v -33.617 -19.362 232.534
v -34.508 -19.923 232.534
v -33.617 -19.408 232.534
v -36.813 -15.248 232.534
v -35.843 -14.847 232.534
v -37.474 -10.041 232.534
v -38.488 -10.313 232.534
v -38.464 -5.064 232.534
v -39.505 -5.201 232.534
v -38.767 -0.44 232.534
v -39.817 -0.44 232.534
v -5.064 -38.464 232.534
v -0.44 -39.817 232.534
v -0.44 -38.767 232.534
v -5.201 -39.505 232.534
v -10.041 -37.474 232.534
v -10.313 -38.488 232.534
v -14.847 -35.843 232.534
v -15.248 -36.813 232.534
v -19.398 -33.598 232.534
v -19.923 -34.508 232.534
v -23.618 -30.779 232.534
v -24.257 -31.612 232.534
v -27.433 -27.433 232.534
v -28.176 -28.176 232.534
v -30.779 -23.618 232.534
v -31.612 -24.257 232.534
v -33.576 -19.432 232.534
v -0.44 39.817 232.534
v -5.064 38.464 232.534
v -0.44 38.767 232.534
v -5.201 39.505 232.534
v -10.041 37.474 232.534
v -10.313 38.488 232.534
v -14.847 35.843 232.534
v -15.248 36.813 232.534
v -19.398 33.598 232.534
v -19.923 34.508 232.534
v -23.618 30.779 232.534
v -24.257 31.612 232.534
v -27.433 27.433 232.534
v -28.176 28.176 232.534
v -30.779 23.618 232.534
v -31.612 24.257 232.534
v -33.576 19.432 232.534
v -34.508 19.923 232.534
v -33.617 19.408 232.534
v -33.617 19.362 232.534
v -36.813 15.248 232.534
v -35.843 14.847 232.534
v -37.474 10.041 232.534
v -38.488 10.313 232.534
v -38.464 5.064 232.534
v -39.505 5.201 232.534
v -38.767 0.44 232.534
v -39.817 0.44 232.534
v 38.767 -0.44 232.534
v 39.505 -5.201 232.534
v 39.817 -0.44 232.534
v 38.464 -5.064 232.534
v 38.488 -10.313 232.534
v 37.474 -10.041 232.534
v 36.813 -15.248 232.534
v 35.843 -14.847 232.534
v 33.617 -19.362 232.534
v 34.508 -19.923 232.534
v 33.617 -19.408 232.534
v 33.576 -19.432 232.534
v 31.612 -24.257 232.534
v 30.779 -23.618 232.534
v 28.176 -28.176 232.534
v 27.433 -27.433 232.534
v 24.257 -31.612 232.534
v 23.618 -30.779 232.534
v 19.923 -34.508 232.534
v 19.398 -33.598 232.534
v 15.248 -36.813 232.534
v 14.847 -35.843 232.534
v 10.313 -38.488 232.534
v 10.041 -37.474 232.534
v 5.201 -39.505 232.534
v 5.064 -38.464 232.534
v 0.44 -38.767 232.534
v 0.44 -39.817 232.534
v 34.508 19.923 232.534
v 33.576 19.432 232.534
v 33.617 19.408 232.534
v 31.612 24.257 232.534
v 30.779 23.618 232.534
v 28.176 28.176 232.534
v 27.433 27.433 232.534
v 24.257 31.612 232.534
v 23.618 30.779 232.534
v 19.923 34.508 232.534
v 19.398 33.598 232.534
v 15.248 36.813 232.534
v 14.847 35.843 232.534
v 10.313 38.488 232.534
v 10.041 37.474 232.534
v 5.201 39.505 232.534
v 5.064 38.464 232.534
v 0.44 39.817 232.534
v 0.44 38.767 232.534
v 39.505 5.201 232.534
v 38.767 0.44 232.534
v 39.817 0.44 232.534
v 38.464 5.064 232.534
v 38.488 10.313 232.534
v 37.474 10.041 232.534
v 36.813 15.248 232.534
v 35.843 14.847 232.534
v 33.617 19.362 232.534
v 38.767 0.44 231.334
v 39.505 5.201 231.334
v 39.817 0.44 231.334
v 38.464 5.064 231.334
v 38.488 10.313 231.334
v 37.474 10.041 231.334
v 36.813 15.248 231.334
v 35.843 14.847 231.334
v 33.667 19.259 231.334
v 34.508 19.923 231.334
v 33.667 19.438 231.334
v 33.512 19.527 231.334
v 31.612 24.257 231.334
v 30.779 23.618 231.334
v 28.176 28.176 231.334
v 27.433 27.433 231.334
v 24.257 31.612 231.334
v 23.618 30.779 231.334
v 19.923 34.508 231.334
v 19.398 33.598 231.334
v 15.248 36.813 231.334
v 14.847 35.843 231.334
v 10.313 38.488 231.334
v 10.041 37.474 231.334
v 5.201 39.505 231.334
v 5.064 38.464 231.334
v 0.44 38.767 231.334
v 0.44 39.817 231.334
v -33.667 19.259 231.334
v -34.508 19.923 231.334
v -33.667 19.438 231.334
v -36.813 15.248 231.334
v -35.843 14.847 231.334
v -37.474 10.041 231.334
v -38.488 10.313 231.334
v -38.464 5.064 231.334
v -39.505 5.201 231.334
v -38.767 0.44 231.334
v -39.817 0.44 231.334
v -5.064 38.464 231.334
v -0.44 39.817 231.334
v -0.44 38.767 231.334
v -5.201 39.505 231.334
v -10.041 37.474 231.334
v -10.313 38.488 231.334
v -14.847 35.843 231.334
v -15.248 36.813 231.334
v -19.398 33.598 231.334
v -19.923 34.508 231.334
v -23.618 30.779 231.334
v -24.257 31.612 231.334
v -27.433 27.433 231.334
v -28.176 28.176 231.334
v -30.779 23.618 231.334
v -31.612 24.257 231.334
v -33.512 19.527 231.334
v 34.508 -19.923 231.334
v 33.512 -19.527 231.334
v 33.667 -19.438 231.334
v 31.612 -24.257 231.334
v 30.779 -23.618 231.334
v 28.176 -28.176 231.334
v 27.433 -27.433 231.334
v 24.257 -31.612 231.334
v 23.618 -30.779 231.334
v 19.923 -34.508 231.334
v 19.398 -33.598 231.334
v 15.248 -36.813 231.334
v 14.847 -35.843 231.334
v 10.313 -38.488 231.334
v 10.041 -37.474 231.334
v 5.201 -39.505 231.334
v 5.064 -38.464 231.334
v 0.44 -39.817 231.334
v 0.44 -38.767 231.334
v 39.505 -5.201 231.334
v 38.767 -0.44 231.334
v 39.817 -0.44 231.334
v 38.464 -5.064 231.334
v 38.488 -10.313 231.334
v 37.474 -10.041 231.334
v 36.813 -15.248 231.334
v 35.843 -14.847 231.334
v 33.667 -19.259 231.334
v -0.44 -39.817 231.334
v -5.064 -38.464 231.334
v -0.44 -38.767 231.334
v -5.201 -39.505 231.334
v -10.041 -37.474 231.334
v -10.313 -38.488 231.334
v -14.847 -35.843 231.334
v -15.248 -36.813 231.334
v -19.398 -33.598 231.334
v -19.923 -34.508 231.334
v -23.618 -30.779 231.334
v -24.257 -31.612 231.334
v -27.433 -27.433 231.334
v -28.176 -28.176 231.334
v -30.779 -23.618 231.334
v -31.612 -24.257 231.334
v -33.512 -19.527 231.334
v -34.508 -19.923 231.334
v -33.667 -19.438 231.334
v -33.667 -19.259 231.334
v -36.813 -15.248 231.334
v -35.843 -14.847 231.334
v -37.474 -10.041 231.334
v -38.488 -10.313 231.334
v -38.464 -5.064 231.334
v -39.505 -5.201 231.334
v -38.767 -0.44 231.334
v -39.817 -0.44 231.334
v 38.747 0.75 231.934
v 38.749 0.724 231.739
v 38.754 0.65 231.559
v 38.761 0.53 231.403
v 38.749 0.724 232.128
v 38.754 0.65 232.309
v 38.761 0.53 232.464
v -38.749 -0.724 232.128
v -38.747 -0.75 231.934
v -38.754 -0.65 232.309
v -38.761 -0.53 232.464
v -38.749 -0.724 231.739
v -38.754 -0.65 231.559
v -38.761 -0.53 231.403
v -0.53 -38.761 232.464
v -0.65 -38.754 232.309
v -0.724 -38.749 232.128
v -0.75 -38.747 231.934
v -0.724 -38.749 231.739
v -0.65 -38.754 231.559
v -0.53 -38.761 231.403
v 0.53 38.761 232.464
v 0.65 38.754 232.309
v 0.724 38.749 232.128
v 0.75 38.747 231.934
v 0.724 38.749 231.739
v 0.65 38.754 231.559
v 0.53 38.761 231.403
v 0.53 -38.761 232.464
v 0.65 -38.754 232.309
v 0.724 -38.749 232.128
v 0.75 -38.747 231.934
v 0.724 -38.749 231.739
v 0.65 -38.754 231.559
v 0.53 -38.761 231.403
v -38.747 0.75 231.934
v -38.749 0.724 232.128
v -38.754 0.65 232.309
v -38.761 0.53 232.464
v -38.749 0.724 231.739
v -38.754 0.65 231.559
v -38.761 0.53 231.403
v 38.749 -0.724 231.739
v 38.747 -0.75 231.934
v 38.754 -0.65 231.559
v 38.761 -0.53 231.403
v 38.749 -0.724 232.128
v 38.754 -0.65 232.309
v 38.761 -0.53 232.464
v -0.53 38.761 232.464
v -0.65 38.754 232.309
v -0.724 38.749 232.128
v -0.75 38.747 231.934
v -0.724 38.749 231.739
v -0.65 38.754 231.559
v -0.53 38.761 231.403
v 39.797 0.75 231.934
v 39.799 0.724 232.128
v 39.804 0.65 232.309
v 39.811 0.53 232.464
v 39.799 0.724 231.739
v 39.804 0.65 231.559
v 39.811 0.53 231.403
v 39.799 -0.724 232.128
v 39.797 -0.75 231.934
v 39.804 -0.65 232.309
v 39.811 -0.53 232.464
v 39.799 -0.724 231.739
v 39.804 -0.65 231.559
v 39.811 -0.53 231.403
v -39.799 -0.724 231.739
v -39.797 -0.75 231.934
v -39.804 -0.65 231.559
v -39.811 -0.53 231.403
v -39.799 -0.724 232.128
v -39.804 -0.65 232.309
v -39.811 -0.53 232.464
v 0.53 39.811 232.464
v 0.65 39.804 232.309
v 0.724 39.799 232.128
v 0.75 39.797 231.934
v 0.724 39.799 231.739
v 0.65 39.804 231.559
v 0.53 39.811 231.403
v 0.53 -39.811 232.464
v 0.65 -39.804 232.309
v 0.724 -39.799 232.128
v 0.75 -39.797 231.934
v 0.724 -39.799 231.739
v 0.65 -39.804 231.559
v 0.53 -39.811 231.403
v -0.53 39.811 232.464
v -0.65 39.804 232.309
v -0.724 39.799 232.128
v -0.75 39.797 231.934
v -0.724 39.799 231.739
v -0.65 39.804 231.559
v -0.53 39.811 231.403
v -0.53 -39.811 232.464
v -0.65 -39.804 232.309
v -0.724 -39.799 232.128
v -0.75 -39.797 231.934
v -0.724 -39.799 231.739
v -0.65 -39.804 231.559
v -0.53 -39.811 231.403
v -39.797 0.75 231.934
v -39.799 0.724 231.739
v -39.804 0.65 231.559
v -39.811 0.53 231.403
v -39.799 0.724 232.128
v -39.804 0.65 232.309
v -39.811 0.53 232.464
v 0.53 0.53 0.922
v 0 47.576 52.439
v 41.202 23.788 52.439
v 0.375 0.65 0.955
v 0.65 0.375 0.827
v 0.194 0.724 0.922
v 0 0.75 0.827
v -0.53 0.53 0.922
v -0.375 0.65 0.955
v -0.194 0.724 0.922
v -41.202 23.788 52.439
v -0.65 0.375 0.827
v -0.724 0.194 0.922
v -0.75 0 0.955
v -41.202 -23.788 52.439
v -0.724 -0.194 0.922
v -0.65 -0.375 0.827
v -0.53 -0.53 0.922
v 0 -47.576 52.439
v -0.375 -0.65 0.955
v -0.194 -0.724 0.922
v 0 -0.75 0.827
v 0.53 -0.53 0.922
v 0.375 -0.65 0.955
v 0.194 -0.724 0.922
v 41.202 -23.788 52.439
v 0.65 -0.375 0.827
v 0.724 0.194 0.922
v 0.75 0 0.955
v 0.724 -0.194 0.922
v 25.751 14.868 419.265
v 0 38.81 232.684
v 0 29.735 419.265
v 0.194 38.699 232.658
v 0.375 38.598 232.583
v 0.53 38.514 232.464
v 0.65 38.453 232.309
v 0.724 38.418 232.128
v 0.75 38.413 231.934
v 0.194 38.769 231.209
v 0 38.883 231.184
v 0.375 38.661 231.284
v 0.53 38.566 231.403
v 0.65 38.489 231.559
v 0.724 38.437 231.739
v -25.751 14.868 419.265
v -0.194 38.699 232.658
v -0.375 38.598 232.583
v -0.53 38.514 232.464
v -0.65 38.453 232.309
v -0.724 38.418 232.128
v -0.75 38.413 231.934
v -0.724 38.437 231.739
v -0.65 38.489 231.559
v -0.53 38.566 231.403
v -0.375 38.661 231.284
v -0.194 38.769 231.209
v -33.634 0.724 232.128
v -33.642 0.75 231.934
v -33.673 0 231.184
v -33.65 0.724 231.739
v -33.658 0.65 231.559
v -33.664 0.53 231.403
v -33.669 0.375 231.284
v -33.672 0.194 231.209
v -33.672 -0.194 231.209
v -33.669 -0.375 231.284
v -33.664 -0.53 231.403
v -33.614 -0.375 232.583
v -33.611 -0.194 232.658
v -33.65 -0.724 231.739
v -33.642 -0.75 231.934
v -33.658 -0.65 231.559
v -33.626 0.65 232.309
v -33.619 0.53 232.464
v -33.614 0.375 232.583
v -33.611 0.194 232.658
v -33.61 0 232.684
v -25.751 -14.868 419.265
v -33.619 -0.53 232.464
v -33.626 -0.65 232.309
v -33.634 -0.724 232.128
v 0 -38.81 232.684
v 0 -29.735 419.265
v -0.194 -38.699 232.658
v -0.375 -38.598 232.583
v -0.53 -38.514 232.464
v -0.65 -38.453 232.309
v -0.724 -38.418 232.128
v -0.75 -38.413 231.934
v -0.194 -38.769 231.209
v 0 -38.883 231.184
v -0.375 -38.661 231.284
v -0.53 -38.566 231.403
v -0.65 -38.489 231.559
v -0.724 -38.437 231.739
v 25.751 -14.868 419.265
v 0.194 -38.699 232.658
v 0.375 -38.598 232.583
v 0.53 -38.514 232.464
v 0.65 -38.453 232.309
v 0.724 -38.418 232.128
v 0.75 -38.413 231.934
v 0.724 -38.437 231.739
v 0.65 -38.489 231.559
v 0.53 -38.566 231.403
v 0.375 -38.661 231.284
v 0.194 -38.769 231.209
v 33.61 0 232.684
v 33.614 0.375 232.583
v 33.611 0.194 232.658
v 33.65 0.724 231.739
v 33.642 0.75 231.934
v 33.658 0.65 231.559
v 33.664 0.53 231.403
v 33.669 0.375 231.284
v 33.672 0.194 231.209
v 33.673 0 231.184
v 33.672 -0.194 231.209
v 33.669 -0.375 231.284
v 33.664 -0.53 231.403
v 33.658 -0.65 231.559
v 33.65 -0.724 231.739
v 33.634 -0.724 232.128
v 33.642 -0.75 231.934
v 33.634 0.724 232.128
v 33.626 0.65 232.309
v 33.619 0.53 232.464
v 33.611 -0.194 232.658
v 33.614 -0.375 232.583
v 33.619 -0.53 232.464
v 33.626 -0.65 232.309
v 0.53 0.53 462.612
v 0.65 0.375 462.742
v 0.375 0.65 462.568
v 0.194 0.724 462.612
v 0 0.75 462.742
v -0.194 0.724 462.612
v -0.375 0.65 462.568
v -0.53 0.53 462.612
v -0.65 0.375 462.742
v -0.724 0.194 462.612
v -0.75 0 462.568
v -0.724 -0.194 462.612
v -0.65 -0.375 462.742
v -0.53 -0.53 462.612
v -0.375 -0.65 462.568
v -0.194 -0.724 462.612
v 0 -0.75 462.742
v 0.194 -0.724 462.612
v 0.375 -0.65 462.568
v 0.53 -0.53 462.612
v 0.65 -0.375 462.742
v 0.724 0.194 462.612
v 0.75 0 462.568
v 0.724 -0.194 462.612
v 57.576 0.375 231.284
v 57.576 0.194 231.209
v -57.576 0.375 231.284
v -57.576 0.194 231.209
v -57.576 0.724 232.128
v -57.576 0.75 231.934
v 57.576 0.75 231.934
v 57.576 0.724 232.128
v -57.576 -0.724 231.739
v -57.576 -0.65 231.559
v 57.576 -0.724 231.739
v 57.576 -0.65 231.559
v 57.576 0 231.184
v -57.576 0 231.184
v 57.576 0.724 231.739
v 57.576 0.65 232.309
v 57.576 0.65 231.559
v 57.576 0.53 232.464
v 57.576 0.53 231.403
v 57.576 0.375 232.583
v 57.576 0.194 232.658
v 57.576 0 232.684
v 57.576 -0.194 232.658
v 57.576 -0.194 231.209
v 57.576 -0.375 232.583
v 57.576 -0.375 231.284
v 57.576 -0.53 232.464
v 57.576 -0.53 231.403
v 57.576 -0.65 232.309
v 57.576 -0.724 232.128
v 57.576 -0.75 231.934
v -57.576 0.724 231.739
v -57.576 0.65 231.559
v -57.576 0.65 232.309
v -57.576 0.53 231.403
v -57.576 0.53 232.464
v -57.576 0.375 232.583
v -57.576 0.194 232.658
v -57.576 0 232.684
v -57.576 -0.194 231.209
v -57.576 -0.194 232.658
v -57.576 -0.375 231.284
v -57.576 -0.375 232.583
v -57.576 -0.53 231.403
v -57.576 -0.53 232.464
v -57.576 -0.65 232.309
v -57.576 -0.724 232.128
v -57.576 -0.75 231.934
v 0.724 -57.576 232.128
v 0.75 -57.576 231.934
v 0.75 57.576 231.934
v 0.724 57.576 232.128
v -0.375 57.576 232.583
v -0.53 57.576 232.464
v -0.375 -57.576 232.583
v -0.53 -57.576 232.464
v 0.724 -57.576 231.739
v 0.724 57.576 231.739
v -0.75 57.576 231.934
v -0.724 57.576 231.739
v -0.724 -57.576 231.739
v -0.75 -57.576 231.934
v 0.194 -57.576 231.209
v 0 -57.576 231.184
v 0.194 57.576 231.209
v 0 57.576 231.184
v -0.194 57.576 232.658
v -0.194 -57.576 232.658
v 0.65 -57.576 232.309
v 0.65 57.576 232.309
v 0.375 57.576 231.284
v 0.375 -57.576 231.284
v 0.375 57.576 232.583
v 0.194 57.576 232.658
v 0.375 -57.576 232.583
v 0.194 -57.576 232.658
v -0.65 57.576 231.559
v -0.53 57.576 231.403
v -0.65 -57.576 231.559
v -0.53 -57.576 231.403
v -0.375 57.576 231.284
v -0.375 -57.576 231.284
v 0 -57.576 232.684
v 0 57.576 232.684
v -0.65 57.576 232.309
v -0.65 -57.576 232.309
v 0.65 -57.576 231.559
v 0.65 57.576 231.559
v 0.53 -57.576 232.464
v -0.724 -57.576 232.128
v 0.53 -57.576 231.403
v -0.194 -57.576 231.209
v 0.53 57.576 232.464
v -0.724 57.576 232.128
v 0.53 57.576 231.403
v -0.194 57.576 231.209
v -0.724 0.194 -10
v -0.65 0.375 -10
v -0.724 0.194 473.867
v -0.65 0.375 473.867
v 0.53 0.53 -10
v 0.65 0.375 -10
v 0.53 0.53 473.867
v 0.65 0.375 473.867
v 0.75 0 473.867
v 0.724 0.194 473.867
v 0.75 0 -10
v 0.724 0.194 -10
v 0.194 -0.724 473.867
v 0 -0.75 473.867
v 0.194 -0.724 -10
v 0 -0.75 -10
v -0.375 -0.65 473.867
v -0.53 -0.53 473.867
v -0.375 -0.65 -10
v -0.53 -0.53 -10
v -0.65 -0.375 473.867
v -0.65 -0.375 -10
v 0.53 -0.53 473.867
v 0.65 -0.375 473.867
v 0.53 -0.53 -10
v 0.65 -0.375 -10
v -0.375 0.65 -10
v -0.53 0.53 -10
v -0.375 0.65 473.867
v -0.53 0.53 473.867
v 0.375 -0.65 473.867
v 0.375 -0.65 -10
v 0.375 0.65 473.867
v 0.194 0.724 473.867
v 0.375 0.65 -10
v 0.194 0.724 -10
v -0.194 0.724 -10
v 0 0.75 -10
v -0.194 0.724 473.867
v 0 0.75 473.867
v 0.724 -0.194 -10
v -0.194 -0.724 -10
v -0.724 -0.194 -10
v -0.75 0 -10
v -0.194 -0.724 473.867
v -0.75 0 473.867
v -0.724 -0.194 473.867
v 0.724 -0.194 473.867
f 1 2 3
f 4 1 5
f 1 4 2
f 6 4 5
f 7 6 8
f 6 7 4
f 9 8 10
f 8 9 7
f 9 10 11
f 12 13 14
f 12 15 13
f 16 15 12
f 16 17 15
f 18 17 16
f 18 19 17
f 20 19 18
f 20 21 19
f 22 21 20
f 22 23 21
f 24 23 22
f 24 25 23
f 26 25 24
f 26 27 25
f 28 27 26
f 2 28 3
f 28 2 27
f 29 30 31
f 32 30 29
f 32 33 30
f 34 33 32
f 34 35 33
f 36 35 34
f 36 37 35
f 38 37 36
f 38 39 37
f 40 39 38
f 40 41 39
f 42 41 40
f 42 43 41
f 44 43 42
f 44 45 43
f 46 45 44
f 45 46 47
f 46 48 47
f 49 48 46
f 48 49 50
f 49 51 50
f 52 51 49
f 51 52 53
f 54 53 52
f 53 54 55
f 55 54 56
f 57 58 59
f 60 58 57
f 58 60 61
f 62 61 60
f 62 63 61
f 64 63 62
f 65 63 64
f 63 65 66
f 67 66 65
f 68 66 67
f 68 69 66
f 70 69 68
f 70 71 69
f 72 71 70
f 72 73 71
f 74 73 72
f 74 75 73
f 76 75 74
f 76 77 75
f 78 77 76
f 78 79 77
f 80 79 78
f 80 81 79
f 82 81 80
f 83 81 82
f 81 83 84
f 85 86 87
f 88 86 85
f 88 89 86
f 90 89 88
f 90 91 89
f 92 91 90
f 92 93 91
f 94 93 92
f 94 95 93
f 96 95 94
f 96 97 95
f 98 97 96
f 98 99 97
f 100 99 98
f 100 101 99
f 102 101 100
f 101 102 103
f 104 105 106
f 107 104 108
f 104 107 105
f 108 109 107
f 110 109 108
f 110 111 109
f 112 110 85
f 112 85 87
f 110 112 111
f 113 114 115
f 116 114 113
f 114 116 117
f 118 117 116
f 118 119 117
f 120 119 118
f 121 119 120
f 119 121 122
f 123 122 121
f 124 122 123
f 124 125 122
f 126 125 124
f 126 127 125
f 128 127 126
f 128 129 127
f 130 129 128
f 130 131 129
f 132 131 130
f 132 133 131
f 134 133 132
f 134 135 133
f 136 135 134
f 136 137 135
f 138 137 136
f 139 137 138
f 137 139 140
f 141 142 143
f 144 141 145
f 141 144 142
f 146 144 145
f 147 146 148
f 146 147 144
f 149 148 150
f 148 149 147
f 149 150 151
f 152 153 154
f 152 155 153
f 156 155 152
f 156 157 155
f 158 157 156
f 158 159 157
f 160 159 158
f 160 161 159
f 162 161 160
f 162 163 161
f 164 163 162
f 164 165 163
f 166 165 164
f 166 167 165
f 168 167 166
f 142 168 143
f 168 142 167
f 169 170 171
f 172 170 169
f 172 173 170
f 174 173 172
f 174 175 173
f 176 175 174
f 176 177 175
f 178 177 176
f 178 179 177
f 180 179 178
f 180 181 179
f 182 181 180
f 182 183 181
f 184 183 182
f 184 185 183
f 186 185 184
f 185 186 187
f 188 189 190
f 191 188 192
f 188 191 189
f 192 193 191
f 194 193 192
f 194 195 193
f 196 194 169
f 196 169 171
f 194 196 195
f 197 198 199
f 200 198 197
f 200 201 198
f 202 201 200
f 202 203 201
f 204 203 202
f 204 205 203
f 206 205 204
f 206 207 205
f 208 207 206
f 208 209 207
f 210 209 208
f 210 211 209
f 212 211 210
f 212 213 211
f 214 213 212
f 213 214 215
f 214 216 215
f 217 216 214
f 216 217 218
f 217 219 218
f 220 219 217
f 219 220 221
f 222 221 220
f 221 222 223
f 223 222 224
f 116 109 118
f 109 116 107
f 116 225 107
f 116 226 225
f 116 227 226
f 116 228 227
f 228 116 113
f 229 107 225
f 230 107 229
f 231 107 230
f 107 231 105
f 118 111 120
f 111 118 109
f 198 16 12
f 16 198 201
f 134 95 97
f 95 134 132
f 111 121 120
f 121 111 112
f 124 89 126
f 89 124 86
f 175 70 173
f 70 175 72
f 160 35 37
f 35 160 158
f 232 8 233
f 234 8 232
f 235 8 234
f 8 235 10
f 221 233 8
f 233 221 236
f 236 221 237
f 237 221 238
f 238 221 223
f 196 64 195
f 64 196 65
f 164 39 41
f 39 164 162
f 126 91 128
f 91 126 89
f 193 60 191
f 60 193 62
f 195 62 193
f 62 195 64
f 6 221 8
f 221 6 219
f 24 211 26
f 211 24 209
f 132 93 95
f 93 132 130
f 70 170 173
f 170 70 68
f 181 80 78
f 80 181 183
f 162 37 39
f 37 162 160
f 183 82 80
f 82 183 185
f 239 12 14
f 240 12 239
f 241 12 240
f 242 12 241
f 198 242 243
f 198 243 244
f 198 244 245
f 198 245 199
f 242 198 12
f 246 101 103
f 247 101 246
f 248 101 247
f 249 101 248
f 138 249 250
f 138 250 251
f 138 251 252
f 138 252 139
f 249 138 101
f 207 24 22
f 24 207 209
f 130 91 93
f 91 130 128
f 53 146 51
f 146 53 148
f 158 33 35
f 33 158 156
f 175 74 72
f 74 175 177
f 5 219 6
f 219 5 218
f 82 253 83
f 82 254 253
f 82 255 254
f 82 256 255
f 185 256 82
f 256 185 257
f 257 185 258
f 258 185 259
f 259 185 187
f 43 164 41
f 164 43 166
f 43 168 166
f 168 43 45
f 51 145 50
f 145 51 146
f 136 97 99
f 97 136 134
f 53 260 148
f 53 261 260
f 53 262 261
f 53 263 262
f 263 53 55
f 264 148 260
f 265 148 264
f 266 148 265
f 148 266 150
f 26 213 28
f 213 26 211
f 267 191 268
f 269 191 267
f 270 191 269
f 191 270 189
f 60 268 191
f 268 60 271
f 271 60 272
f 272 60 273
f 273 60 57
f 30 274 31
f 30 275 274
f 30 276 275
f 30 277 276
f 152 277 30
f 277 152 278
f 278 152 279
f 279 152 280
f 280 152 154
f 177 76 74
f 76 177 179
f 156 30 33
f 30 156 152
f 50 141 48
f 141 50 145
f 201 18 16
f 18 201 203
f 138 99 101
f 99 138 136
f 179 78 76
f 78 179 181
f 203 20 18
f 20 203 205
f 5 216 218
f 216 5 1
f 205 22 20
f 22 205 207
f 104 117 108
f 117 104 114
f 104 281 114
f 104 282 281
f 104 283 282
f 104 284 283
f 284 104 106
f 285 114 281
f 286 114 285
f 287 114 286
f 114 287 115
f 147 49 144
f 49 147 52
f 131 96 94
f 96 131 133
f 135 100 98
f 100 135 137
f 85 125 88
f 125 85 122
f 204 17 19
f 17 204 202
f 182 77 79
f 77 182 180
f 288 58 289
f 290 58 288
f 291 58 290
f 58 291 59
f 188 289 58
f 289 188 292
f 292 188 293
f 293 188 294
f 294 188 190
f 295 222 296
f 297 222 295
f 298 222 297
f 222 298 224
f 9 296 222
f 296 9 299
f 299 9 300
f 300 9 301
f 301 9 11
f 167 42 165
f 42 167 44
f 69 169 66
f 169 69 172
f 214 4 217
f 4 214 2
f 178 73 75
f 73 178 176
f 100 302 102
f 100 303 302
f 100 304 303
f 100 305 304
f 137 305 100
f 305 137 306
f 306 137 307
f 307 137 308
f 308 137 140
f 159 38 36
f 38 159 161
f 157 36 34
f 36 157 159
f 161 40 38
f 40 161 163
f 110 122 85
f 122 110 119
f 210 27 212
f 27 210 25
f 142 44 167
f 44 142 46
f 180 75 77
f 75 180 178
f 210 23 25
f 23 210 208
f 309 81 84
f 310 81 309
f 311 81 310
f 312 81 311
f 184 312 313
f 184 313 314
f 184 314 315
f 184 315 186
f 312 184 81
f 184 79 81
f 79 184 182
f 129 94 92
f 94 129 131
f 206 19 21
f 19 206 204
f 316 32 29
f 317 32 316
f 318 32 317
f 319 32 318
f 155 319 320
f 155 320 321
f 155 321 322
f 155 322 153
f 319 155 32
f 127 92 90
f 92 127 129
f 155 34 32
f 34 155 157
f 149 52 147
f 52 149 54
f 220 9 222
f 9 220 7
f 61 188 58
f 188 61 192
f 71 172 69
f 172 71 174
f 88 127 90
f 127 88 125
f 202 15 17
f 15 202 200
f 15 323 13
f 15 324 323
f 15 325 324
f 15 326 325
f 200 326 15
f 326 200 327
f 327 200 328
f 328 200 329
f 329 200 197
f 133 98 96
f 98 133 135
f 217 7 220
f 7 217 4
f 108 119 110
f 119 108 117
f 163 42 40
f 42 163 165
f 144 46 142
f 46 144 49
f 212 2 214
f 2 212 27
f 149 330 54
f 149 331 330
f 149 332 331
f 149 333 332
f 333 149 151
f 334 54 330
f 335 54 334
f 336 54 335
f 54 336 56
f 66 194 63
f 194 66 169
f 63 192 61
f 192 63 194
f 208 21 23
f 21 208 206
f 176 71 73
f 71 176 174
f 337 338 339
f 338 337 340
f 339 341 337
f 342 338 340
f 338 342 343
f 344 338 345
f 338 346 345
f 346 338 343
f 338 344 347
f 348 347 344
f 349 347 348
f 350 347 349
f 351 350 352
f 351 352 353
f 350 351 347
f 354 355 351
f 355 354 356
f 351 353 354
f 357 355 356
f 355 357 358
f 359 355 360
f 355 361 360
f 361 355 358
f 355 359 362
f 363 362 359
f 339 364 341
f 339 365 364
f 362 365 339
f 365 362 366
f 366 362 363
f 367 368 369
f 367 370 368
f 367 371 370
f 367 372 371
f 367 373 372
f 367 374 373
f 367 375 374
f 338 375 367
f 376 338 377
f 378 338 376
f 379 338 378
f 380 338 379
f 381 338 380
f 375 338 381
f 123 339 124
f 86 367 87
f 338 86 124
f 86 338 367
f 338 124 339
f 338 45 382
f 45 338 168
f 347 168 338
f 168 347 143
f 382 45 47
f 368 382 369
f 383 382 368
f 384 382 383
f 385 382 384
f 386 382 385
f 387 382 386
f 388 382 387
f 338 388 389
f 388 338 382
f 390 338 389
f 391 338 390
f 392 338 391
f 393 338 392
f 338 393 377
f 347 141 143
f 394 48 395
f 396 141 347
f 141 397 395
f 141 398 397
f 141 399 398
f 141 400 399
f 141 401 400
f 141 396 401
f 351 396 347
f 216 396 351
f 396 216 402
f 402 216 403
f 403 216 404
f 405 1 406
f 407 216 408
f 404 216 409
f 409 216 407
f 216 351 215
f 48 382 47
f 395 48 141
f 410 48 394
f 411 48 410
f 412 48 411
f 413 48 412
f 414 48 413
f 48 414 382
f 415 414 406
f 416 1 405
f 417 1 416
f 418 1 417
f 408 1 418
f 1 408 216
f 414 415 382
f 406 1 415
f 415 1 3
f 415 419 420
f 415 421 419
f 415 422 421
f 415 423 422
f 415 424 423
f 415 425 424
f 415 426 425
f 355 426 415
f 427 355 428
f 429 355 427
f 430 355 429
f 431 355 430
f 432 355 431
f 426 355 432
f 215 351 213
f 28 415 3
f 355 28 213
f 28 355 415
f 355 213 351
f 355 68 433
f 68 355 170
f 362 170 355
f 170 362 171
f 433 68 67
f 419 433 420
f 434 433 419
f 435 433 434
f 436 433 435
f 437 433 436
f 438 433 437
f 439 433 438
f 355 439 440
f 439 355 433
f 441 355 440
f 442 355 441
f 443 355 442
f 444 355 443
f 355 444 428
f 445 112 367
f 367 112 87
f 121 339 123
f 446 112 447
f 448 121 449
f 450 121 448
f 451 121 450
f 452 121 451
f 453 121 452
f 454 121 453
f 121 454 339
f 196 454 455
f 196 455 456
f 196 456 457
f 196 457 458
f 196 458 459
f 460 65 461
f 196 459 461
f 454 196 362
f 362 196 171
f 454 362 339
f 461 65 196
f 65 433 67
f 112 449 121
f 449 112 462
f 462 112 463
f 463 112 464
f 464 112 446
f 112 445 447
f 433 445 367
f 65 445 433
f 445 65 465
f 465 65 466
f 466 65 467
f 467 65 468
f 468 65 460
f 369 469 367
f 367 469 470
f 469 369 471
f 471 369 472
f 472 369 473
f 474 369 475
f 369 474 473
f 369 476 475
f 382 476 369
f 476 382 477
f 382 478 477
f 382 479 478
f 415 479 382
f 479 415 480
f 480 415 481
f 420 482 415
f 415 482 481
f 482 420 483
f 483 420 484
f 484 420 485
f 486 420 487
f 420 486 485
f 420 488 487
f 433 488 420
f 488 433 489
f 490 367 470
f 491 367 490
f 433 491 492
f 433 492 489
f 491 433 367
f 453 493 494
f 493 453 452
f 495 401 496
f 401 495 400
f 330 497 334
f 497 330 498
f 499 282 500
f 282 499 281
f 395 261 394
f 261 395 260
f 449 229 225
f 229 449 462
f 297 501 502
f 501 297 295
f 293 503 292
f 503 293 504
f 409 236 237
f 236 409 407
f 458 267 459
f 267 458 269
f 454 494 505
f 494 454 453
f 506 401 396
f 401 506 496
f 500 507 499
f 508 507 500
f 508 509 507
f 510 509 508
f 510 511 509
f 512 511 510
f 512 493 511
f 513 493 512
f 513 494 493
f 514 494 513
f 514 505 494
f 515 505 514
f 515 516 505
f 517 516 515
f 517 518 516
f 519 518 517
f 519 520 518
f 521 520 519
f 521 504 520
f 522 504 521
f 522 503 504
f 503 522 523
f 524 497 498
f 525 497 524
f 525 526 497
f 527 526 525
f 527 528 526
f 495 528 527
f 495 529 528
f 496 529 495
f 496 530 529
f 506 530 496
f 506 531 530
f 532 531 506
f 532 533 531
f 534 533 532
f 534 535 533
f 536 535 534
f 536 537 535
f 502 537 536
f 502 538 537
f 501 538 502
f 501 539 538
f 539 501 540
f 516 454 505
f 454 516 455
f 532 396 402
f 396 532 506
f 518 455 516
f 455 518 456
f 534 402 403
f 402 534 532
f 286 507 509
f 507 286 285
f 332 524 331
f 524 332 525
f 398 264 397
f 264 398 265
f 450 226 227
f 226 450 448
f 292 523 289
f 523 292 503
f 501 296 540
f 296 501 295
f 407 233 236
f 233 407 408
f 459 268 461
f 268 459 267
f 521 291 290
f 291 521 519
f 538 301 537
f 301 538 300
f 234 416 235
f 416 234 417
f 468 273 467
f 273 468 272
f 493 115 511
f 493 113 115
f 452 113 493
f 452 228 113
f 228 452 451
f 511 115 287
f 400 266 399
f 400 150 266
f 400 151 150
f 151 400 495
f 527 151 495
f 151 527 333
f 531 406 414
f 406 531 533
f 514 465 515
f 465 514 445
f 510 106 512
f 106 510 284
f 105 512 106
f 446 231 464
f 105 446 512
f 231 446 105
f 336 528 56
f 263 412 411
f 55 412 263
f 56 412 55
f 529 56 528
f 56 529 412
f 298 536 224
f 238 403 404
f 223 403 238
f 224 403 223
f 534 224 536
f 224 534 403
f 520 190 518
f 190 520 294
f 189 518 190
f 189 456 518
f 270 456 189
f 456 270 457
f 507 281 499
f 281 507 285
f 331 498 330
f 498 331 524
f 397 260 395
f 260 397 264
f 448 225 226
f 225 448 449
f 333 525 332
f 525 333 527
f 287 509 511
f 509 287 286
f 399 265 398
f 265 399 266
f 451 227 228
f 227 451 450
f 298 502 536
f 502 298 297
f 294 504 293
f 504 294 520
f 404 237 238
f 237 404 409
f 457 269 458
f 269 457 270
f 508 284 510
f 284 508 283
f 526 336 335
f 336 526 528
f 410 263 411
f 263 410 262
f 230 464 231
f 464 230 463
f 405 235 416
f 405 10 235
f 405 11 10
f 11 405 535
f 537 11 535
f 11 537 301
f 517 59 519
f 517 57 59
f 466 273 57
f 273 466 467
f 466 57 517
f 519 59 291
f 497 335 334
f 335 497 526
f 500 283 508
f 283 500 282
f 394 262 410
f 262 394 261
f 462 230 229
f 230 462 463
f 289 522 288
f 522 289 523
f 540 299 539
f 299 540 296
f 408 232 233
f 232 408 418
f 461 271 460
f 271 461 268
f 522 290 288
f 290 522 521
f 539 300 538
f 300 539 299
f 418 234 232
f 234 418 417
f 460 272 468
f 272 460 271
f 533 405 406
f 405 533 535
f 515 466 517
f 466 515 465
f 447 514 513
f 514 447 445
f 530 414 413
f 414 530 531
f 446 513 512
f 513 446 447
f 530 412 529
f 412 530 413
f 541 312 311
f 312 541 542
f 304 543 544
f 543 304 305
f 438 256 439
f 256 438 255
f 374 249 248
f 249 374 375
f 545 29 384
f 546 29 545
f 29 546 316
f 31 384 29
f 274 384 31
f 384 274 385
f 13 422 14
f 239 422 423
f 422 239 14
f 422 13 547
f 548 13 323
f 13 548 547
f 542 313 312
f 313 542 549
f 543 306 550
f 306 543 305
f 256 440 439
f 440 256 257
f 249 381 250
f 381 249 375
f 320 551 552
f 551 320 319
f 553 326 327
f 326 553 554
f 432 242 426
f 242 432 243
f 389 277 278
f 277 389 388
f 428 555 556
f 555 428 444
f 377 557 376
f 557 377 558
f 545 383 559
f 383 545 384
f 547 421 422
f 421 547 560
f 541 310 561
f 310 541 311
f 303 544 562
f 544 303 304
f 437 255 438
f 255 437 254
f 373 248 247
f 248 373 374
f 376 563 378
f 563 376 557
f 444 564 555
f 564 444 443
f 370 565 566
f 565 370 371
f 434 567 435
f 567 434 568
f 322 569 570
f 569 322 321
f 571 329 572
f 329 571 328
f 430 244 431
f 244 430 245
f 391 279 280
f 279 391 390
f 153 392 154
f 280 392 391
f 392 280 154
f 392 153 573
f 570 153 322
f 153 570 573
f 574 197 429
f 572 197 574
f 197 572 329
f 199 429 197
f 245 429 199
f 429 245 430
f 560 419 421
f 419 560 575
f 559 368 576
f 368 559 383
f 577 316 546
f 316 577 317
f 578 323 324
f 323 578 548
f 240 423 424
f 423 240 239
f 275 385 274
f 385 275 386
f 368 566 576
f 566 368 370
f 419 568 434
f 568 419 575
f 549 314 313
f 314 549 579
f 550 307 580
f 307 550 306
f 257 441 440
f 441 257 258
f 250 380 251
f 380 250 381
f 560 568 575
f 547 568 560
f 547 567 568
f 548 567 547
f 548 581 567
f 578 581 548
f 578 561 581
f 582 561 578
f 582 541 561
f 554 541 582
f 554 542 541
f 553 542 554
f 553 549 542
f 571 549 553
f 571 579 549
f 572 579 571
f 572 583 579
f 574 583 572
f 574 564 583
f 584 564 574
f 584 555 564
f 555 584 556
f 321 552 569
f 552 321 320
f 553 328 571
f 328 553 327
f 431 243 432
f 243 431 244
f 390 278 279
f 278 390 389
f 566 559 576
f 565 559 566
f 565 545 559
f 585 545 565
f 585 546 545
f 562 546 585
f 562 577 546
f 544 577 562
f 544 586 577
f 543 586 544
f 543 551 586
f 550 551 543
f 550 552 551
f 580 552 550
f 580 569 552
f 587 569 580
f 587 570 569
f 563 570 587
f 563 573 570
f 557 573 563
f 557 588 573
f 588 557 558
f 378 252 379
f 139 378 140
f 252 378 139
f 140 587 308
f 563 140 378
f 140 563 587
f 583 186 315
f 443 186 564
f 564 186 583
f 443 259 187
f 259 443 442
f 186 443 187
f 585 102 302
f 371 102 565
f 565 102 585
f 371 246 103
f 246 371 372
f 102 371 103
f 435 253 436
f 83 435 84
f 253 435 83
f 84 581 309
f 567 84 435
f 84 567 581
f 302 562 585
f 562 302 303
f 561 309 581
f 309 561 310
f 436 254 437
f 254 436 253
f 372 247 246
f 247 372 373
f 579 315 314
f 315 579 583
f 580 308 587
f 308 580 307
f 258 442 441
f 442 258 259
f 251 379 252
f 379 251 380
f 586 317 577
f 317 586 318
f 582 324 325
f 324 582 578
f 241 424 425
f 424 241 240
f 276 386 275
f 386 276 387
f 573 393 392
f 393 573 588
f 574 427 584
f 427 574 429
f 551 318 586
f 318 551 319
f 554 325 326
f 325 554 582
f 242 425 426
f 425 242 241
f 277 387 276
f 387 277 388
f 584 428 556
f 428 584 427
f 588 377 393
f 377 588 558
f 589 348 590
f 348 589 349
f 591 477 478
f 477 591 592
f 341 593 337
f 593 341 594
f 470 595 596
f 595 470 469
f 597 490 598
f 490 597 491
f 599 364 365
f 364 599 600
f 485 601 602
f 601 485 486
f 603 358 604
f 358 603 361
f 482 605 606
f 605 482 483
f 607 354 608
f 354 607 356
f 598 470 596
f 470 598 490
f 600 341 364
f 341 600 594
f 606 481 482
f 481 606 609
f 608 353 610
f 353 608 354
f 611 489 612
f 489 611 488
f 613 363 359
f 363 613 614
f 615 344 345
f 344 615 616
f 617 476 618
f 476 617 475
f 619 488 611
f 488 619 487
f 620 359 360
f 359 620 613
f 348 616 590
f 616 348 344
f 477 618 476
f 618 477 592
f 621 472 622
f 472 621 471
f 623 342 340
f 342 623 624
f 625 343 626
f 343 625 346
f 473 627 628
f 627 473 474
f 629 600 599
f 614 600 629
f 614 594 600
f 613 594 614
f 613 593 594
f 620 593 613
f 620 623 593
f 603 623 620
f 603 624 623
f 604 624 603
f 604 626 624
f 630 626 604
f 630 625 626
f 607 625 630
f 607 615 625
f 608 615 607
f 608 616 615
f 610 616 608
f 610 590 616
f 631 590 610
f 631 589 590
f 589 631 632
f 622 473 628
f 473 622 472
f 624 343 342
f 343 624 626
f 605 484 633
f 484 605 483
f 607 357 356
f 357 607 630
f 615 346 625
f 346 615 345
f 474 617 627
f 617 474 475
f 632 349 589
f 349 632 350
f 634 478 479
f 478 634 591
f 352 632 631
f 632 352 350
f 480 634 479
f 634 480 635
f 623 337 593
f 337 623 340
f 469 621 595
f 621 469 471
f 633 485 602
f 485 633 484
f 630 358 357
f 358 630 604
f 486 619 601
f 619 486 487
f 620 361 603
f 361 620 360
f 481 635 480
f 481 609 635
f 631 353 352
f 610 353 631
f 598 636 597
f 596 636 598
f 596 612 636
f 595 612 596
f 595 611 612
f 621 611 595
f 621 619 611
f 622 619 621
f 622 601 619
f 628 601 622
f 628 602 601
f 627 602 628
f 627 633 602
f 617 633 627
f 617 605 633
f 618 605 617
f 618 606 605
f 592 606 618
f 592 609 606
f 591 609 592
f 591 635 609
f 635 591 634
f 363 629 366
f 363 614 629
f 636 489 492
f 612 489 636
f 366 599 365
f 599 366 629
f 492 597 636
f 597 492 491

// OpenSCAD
/*
  Vogel / Eredyon-style faceted quartz representative model generator v7
  Scale-A 4096 Hz bulk-acoustic candidate integration
  ----------------------------------------------------------------------
  Units: millimetres.

  This file is a geometry and calculation aid. It does not assert that the
  finished crystal will resonate at the requested frequency. The exact mode
  depends on anisotropic material tensors, crystal orientation, termination
  reflection, electrodes, supports, temperature, stress, and machining.

  v7 additions:
    - ScaleA_4096Hz_Shear_463p867mm_6sided preset.
    - Exact effective half-wave path calculation from f = v/(2L).
    - Separate effective acoustic path and nominal CAD tip-to-tip length.
    - Shear and longitudinal working branch controls.
    - Manufacturing envelope and axis-reference helpers.
    - Design-sheet echo output with geometry, volume, mass, and unresolved data.
    - R10.15 boundary: 4096 Hz is not treated as the electromagnetic
      surface-wave carrier.

  Default angle convention:
    face_slope = angle between termination face and its base plane.

  Default diameter convention:
    across_vertices = maximum caliper width of the regular polygon.
*/

// ----------------------------
// OpenSCAD Customizer controls
// ----------------------------

/* [Render] */
render_mode = "single"; // [single, design_sheet, acoustic_path_reference, harmonic_ladder, collector_only, compact_mode_crystal]
model_scale = 1.0; // [0.01:0.01:3]
spacing_mm = 130; // [30:5:800]

/* [Preset] */
selected_preset = "ScaleA_4096Hz_Shear_463p867mm_6sided"; // [ScaleA_4096Hz_Shear_463p867mm_6sided, ScaleA_4096Hz_Longitudinal_695p801mm_6sided_Control, Custom, Himalayan_157mm_8sided, Ideal_N5_154mm_6sided_ratio, Prototype_153mm_6sided, Prototype_152mm_6sided, Prototype_101mm_6sided, Ideal_N6_128mm_6sided_ratio, Ideal_N7_110mm_6sided_ratio, Ideal_N9_86mm_6sided_ratio, Himalayan_125mm_8sided, Himalayan_125mm_12sided, Citrine_71mm_24sided, Citrine_81mm_8sided, Smoky_62mm_24sided, Rutilated_86mm_24sided]

/* [Acoustic path candidate] */
sizing_mode = "preset_dimensions"; // [preset_dimensions, ratio_from_length, ideal_half_wave_branch, ideal_4096_harmonic]
target_frequency_hz = 4096; // [1:1:10000000]
acoustic_branch = "shear_proxy"; // [shear_proxy, longitudinal_proxy, custom_velocity]
quartz_shear_velocity_m_s = 3800; // [2500:1:5000]
quartz_longitudinal_velocity_m_s = 5700; // [4500:1:7000]
custom_phase_velocity_m_s = 3800; // [100:1:10000]
harmonic_N = 1; // [1:1:128]
effective_path_correction_mm = 0; // [-100:0.001:100]
nominal_body_minus_effective_path_mm = 0; // [-100:0.001:100]

/* [Ratio geometry] */
length_to_avg_diameter = 6.0; // [2:0.1:20]
wide_to_narrow_ratio = 1.6; // [1:0.01:4]

/* [Custom geometry] */
custom_length_mm = 463.8671875; // [20:0.001:1000]
custom_sides = 6; // [3:1:48]
custom_wide_d_mm = 95.15224359; // [3:0.001:300]
custom_narrow_d_mm = 59.47015224; // [3:0.001:300]
custom_rx_angle_deg = 51.843; // [20:0.001:80]
custom_tx_angle_deg = 60; // [20:0.001:80]

/* [Geometry convention] */
angle_mode = "face_slope"; // [face_slope, apex_included, axis_to_face]
diameter_mode = "across_vertices"; // [across_vertices, across_flats]
facet_rotation_deg = 30; // [0:1:360]
use_angle_overrides = false;
rx_angle_override_deg = 51.843; // [20:0.001:80]
tx_angle_override_deg = 60; // [20:0.001:80]

/* [Material bookkeeping] */
quartz_density_g_cm3 = 2.65; // [2.5:0.001:2.8]
operating_temperature_C = 25; // [-50:0.1:300]
frequency_temperature_correction_ppm = 0; // [-10000:0.1:10000]

/* [Manufacturing envelope, visual only] */
show_manufacturing_envelope = false;
blank_radial_allowance_mm = 5; // [0:0.1:30]
blank_end_allowance_mm = 5; // [0:0.1:30]
show_axis_reference = true;
axis_rod_radius_mm = 0.75; // [0.1:0.05:5]
axis_reference_offset_mm = 25; // [5:1:200]

/* [Markers] */
show_metric_center_marker = true;
show_geometry_eye_marker = true;
geometry_eye_fraction_from_female = 0.50; // [0:0.001:1]
show_measured_eye_marker = false;
measured_eye_from_female_mm = 231.93359375; // [0:0.001:1000]
marker_width_mm = 1.2; // [0.1:0.1:10]
metric_marker_radius_extra_mm = 0.5; // [0.1:0.05:5]
geometry_marker_radius_extra_mm = 1.0; // [0.1:0.05:5]
measured_marker_radius_extra_mm = 1.5; // [0.1:0.05:5]

/* [Compact mode references] */
show_compact_mode_rings = false;
compact_mode_count = 12; // [1:1:64]
compact_mode_parity = "all"; // [all, odd, even]
compact_ring_width_mm = 0.7; // [0.1:0.05:5]
compact_ring_radius_extra_mm = 0.7; // [0.1:0.05:5]

/* [Coil reference, visual only] */
show_coil_reference = false;
coil_turns = 40; // [1:1:300]
coil_wire_d_mm = 1.0; // [0.1:0.05:10]
coil_clearance_mm = 6.0; // [0:0.1:50]
coil_phase_deg = 0; // [0:1:360]
show_counter_coil = true;

/* [Collector reference, visual only] */
show_pyramid_collector = false;
collector_slope_deg = 52; // [20:0.1:80]
collector_height_ratio_of_crystal = 0.20; // [0.05:0.01:1]
collector_gap_above_tip_mm = 5; // [0:0.1:100]
collector_wall_mm = 2; // [0.2:0.1:20]

$fn = 96;

// ----------------------------
// Preset data
// [L, sides, wide, narrow, rx, tx, branch_name, velocity_m_s, target_hz]
// ----------------------------

function preset_values(p) =
    p == "ScaleA_4096Hz_Shear_463p867mm_6sided" ?
        [463.8671875, 6, 95.1522435897, 59.4701522436, 51.843, 60, "shear_proxy", 3800, 4096] :
    p == "ScaleA_4096Hz_Longitudinal_695p801mm_6sided_Control" ?
        [695.80078125, 6, 142.728365385, 89.2052283654, 51.843, 60, "longitudinal_proxy", 5700, 4096] :
    p == "Himalayan_157mm_8sided" ?
        [157, 8, 32, 20, 51.843, 60, "unspecified", 0, 0] :
    p == "Ideal_N5_154mm_6sided_ratio" ?
        [154.052734375, 6, 31.6005608974, 19.7503505609, 51.843, 60, "legacy_longitudinal_proxy", 6310, 4096*5] :
    p == "Prototype_153mm_6sided" ?
        [153, 6, 32, 20, 51.843, 60, "unspecified", 0, 0] :
    p == "Prototype_152mm_6sided" ?
        [152, 6, 32, 20, 51.843, 60, "unspecified", 0, 0] :
    p == "Prototype_101mm_6sided" ?
        [101, 6, 22, 16, 51.843, 60, "unspecified", 0, 0] :
    p == "Ideal_N6_128mm_6sided_ratio" ?
        [128.377278646, 6, 26.333800748, 16.458625468, 51.843, 60, "legacy_longitudinal_proxy", 6310, 4096*6] :
    p == "Ideal_N7_110mm_6sided_ratio" ?
        [110.037667411, 6, 22.571829213, 14.107393258, 51.843, 60, "legacy_longitudinal_proxy", 6310, 4096*7] :
    p == "Ideal_N9_86mm_6sided_ratio" ?
        [85.584852431, 6, 17.555867165, 10.972416978, 51.843, 60, "legacy_longitudinal_proxy", 6310, 4096*9] :
    p == "Himalayan_125mm_8sided" ?
        [125, 8, 21, 14, 51.843, 60, "unspecified", 0, 0] :
    p == "Himalayan_125mm_12sided" ?
        [125, 12, 20, 16, 51.843, 60, "unspecified", 0, 0] :
    p == "Citrine_71mm_24sided" ?
        [71, 24, 20, 15, 51.843, 60, "unspecified", 0, 0] :
    p == "Citrine_81mm_8sided" ?
        [81, 8, 19, 15, 51.843, 60, "unspecified", 0, 0] :
    p == "Smoky_62mm_24sided" ?
        [62, 24, 21, 17, 51.843, 60, "unspecified", 0, 0] :
    p == "Rutilated_86mm_24sided" ?
        [86, 24, 35, 29, 51.843, 60, "unspecified", 0, 0] :
        [custom_length_mm, custom_sides, custom_wide_d_mm, custom_narrow_d_mm,
         custom_rx_angle_deg, custom_tx_angle_deg, acoustic_branch,
         selected_velocity_m_s(), target_frequency_hz];

function selected_velocity_m_s() =
    acoustic_branch == "longitudinal_proxy" ? quartz_longitudinal_velocity_m_s :
    acoustic_branch == "custom_velocity" ? custom_phase_velocity_m_s :
    quartz_shear_velocity_m_s;

function ideal_half_wave_path_mm(v_m_s, f_hz, N=1) =
    v_m_s / (2 * f_hz * N) * 1000 + effective_path_correction_mm;

function ratio_widths_from_length(L, ld=6, taper=1.6) =
    let(avg = L / ld, narrow = 2 * avg / (1 + taper), wide = taper * narrow)
    [wide, narrow];

function selected_raw() = preset_values(selected_preset);

function selected_effective_path_mm() =
    sizing_mode == "ideal_half_wave_branch" ?
        ideal_half_wave_path_mm(selected_velocity_m_s(), target_frequency_hz, harmonic_N) :
    sizing_mode == "ideal_4096_harmonic" ?
        ideal_half_wave_path_mm(quartz_longitudinal_velocity_m_s, 4096, harmonic_N) :
    selected_raw()[0] - nominal_body_minus_effective_path_mm;

function selected_length_mm() =
    (sizing_mode == "ideal_half_wave_branch" || sizing_mode == "ideal_4096_harmonic") ?
        selected_effective_path_mm() + nominal_body_minus_effective_path_mm :
    selected_preset == "Custom" ? custom_length_mm : selected_raw()[0];

function selected_sides() =
    selected_preset == "Custom" ? custom_sides : selected_raw()[1];

function selected_widths() =
    (sizing_mode == "ratio_from_length" ||
     sizing_mode == "ideal_half_wave_branch" ||
     sizing_mode == "ideal_4096_harmonic") ?
        ratio_widths_from_length(selected_length_mm(), length_to_avg_diameter, wide_to_narrow_ratio) :
    selected_preset == "Custom" ? [custom_wide_d_mm, custom_narrow_d_mm] :
        [selected_raw()[2], selected_raw()[3]];

function selected_rx() =
    use_angle_overrides ? rx_angle_override_deg :
    selected_preset == "Custom" ? custom_rx_angle_deg : selected_raw()[4];

function selected_tx() =
    use_angle_overrides ? tx_angle_override_deg :
    selected_preset == "Custom" ? custom_tx_angle_deg : selected_raw()[5];

// ----------------------------
// Geometry functions
// ----------------------------

function circumradius_from_diameter(d, n, mode) =
    mode == "across_flats" ? (d/2) / cos(180/n) : d/2;

function apothem_from_R(R, n) = R * cos(180/n);
function polygon_area_from_R(R, n) = n/2 * R*R * sin(360/n);

function cap_height_from_angle(d, n, angle_deg, mode, dmode) =
    let(R = circumradius_from_diameter(d, n, dmode),
        a = apothem_from_R(R, n))
    mode == "apex_included" ? a / tan(angle_deg/2) :
    mode == "axis_to_face"  ? a / tan(angle_deg) :
                              a * tan(angle_deg);

function ring_points(n, R, z, rot) =
    [for (i=[0:n-1]) [R*cos(rot+360*i/n), R*sin(rot+360*i/n), z]];

function crystal_faces(n) =
    concat(
        [for (i=[0:n-1]) [0, 1+((i+1)%n), 1+i]],
        [for (i=[0:n-1]) [1+i, 1+((i+1)%n), 1+n+((i+1)%n), 1+n+i]],
        [for (i=[0:n-1]) [1+2*n, 1+n+i, 1+n+((i+1)%n)]]
    );

function radius_at_z(z, L, rx_h, tx_h, Rw, Rn) =
    z <= rx_h ? max(Rw*z/max(rx_h,0.001),0) :
    z >= L-tx_h ? max(Rn*(L-z)/max(tx_h,0.001),0) :
    Rw + (Rn-Rw)*((z-rx_h)/max(L-rx_h-tx_h,0.001));

function volume_mm3(L,n,wide_d,narrow_d,rx_deg,tx_deg,amode,dmode) =
    let(
        Rw = circumradius_from_diameter(wide_d,n,dmode),
        Rn = circumradius_from_diameter(narrow_d,n,dmode),
        Aw = polygon_area_from_R(Rw,n),
        An = polygon_area_from_R(Rn,n),
        hr = cap_height_from_angle(wide_d,n,rx_deg,amode,dmode),
        ht = cap_height_from_angle(narrow_d,n,tx_deg,amode,dmode),
        hs = L-hr-ht
    )
    hs/3*(Aw+An+sqrt(Aw*An)) + Aw*hr/3 + An*ht/3;

// ----------------------------
// Main crystal
// ----------------------------

module vogel_crystal(L,n,wide_d,narrow_d,rx_deg,tx_deg,label="model") {
    Rw = circumradius_from_diameter(wide_d,n,diameter_mode);
    Rn = circumradius_from_diameter(narrow_d,n,diameter_mode);
    hr = cap_height_from_angle(wide_d,n,rx_deg,angle_mode,diameter_mode);
    ht = cap_height_from_angle(narrow_d,n,tx_deg,angle_mode,diameter_mode);
    hs = L-hr-ht;
    vol_cm3 = volume_mm3(L,n,wide_d,narrow_d,rx_deg,tx_deg,angle_mode,diameter_mode)/1000;
    mass_g = vol_cm3*quartz_density_g_cm3;
    effective_path = selected_effective_path_mm();
    selected_v = selected_preset == "Custom" ? selected_velocity_m_s() :
                 selected_raw()[7] > 0 ? selected_raw()[7] : selected_velocity_m_s();
    proxy_frequency = selected_v > 0 && effective_path > 0 ?
                      selected_v/(2*(effective_path/1000)*harmonic_N) : 0;

    echo("--------------------------------------------------");
    echo(str("MODEL=",label));
    echo(str("STATUS=GEOMETRY_AND_HALF_WAVE_PROXY_ONLY"));
    echo(str("L_tip_to_tip=",L," mm"));
    echo(str("L_effective_candidate=",effective_path," mm"));
    echo(str("facets=",n,", wide=",wide_d," mm, narrow=",narrow_d," mm"));
    echo(str("angles_rx_tx=",rx_deg,"/",tx_deg," deg"));
    echo(str("rx_cap=",hr," mm, shaft=",hs," mm, tx_cap=",ht," mm"));
    echo(str("volume=",vol_cm3," cm3, mass_proxy=",mass_g," g"));
    echo(str("working_velocity=",selected_v," m/s, harmonic_N=",harmonic_N));
    echo(str("half_wave_frequency_proxy=",proxy_frequency," Hz"));
    echo(str("temperature_C=",operating_temperature_C,
             ", frequency_temperature_input_ppm=",frequency_temperature_correction_ppm));
    echo("NONCLAIM: this is not a measured resonance or validated mode.");
    echo("NONCLAIM: 4096 Hz is not the R10.15 electromagnetic surface-wave carrier.");
    echo("REQUIRED: full anisotropic eigenmode, fixture, electrode, thermal, and uncertainty solve.");
    echo("--------------------------------------------------");

    assert(n >= 3, "Facet count must be at least 3.");
    assert(hs > 0, "Termination heights exceed total body length.");
    assert(L > 0 && wide_d > 0 && narrow_d > 0, "All dimensions must be positive.");

    pts = concat(
        [[0,0,0]],
        ring_points(n,Rw,hr,facet_rotation_deg),
        ring_points(n,Rn,L-ht,facet_rotation_deg),
        [[0,0,L]]
    );

    union() {
        polyhedron(points=pts,faces=crystal_faces(n),convexity=10);

        if (show_metric_center_marker)
            node_marker(L/2,L,n,hr,ht,Rw,Rn,metric_marker_radius_extra_mm,"metric_center");
        if (show_geometry_eye_marker)
            node_marker(L*geometry_eye_fraction_from_female,L,n,hr,ht,Rw,Rn,geometry_marker_radius_extra_mm,"geometry_estimate");
        if (show_measured_eye_marker)
            node_marker(measured_eye_from_female_mm,L,n,hr,ht,Rw,Rn,measured_marker_radius_extra_mm,"measured_input");
        if (show_compact_mode_rings)
            compact_mode_rings(L,n,hr,ht,Rw,Rn);
    }
}

module node_marker(z,L,n,hr,ht,Rw,Rn,extra,label="node") {
    zs = min(max(z,0),L);
    r = radius_at_z(zs,L,hr,ht,Rw,Rn);
    echo(str("NODE_MARKER=",label,", z=",zs," mm, fraction=",zs/L));
    translate([0,0,zs-marker_width_mm/2])
        difference() {
            cylinder(h=marker_width_mm,r=r+extra,$fn=n*8);
            translate([0,0,-0.1])
                cylinder(h=marker_width_mm+0.2,r=max(r-0.05,0.1),$fn=n*8);
        }
}

module compact_mode_rings(L,n,hr,ht,Rw,Rn) {
    for (k=[1:compact_mode_count]) {
        allowed = compact_mode_parity == "all" ||
                  (compact_mode_parity == "odd" && k%2==1) ||
                  (compact_mode_parity == "even" && k%2==0);
        if (allowed) {
            z = L*k/(compact_mode_count+1);
            r = radius_at_z(z,L,hr,ht,Rw,Rn);
            translate([0,0,z-compact_ring_width_mm/2])
                difference() {
                    cylinder(h=compact_ring_width_mm,r=r+compact_ring_radius_extra_mm,$fn=n*8);
                    translate([0,0,-0.05])
                        cylinder(h=compact_ring_width_mm+0.1,r=max(r-0.04,0.1),$fn=n*8);
                }
        }
    }
}

// ----------------------------
// Reference helpers
// ----------------------------

module axis_references(L,wide_d) {
    o = max(axis_reference_offset_mm,wide_d/2+10);
    color("red")
        translate([0,0,L/2]) rotate([0,90,0])
            cylinder(h=2*o,r=axis_rod_radius_mm,center=true,$fn=24);
    color("green")
        translate([0,0,L/2]) rotate([90,0,0])
            cylinder(h=2*o,r=axis_rod_radius_mm,center=true,$fn=24);
    color("blue")
        translate([0,0,L/2])
            cylinder(h=L+20,r=axis_rod_radius_mm,center=true,$fn=24);
}

module manufacturing_envelope(L,wide_d) {
    color([0.7,0.7,0.7,0.15])
        translate([0,0,-blank_end_allowance_mm])
            cylinder(
                h=L+2*blank_end_allowance_mm,
                r=wide_d/2+blank_radial_allowance_mm,
                $fn=96
            );
}

module coil_reference_helix(L,radius,turns,wire_d,phase=0) {
    steps=max(turns*20,40);
    for (i=[0:steps]) {
        t=i/steps;
        a=phase+360*turns*t;
        translate([radius*cos(a),radius*sin(a),L*t])
            sphere(r=wire_d/2,$fn=12);
    }
}

module square_pyramid_shell(height_mm=30,slope_deg=52,wall_mm=2) {
    hb=height_mm/tan(slope_deg);
    hi=max(height_mm-wall_mm,0.1);
    hbi=max(hb-wall_mm,0.1);
    difference() {
        polyhedron(
            points=[[-hb,-hb,0],[hb,-hb,0],[hb,hb,0],[-hb,hb,0],[0,0,height_mm]],
            faces=[[0,1,2,3],[0,4,1],[1,4,2],[2,4,3],[3,4,0]],
            convexity=10
        );
        translate([0,0,-0.05])
            polyhedron(
                points=[[-hbi,-hbi,0],[hbi,-hbi,0],[hbi,hbi,0],[-hbi,hbi,0],[0,0,hi]],
                faces=[[0,1,2,3],[0,4,1],[1,4,2],[2,4,3],[3,4,0]],
                convexity=10
            );
    }
}

module acoustic_path_reference(L) {
    color([0.15,0.4,1.0,0.8])
        cylinder(h=L,r=1.2,$fn=24);
    for (f=[0,0.25,0.5,0.75,1])
        translate([0,0,L*f])
            color([1.0,0.3,0.1,0.8])
                cylinder(h=0.8,r=8,$fn=48);
}

module design_sheet() {
    L=selected_length_mm();
    n=selected_sides();
    w=selected_widths();
    RX=selected_rx();
    TX=selected_tx();

    render_current("design_sheet_crystal");
    translate([w[0]*1.8,0,0])
        acoustic_path_reference(selected_effective_path_mm());
    translate([-w[0]*1.8,0,0])
        manufacturing_envelope(L,w[0]);
}

// ----------------------------
// Dispatch
// ----------------------------

module render_current(label="current") {
    L=selected_length_mm();
    n=selected_sides();
    w=selected_widths();
    RX=selected_rx();
    TX=selected_tx();

    scale([model_scale,model_scale,model_scale]) {
        color([0.82,0.94,1.0,0.62])
            vogel_crystal(L,n,w[0],w[1],RX,TX,label);

        if (show_axis_reference)
            axis_references(L,w[0]);

        if (show_manufacturing_envelope)
            manufacturing_envelope(L,w[0]);

        if (show_pyramid_collector) {
            ch=L*collector_height_ratio_of_crystal;
            translate([0,0,L+collector_gap_above_tip_mm])
                square_pyramid_shell(ch,collector_slope_deg,collector_wall_mm);
        }

        if (show_coil_reference) {
            cr=max(w[0],w[1])/2+coil_clearance_mm;
            coil_reference_helix(L,cr,coil_turns,coil_wire_d_mm,coil_phase_deg);
            if (show_counter_coil)
                coil_reference_helix(L,cr+2,coil_turns,coil_wire_d_mm,coil_phase_deg+180);
        }
    }
}

module harmonic_ladder() {
    for (i=[1:8]) {
        Li=ideal_half_wave_path_mm(selected_velocity_m_s(),target_frequency_hz,i);
        wi=ratio_widths_from_length(Li,length_to_avg_diameter,wide_to_narrow_ratio);
        translate([(i-1)%4*spacing_mm,floor((i-1)/4)*spacing_mm,0])
            vogel_crystal(Li,custom_sides,wi[0],wi[1],selected_rx(),selected_tx(),str("harmonic_N_",i));
    }
}

if (render_mode == "design_sheet")
    design_sheet();
else if (render_mode == "acoustic_path_reference")
    acoustic_path_reference(selected_effective_path_mm());
else if (render_mode == "harmonic_ladder")
    harmonic_ladder();
else if (render_mode == "collector_only")
    square_pyramid_shell(
        selected_length_mm()*collector_height_ratio_of_crystal,
        collector_slope_deg,
        collector_wall_mm
    );
else if (render_mode == "compact_mode_crystal") {
    show_compact_mode_rings = true;
    render_current(str(selected_preset,"_compact_modes"));
}
else
    render_current(selected_preset);
